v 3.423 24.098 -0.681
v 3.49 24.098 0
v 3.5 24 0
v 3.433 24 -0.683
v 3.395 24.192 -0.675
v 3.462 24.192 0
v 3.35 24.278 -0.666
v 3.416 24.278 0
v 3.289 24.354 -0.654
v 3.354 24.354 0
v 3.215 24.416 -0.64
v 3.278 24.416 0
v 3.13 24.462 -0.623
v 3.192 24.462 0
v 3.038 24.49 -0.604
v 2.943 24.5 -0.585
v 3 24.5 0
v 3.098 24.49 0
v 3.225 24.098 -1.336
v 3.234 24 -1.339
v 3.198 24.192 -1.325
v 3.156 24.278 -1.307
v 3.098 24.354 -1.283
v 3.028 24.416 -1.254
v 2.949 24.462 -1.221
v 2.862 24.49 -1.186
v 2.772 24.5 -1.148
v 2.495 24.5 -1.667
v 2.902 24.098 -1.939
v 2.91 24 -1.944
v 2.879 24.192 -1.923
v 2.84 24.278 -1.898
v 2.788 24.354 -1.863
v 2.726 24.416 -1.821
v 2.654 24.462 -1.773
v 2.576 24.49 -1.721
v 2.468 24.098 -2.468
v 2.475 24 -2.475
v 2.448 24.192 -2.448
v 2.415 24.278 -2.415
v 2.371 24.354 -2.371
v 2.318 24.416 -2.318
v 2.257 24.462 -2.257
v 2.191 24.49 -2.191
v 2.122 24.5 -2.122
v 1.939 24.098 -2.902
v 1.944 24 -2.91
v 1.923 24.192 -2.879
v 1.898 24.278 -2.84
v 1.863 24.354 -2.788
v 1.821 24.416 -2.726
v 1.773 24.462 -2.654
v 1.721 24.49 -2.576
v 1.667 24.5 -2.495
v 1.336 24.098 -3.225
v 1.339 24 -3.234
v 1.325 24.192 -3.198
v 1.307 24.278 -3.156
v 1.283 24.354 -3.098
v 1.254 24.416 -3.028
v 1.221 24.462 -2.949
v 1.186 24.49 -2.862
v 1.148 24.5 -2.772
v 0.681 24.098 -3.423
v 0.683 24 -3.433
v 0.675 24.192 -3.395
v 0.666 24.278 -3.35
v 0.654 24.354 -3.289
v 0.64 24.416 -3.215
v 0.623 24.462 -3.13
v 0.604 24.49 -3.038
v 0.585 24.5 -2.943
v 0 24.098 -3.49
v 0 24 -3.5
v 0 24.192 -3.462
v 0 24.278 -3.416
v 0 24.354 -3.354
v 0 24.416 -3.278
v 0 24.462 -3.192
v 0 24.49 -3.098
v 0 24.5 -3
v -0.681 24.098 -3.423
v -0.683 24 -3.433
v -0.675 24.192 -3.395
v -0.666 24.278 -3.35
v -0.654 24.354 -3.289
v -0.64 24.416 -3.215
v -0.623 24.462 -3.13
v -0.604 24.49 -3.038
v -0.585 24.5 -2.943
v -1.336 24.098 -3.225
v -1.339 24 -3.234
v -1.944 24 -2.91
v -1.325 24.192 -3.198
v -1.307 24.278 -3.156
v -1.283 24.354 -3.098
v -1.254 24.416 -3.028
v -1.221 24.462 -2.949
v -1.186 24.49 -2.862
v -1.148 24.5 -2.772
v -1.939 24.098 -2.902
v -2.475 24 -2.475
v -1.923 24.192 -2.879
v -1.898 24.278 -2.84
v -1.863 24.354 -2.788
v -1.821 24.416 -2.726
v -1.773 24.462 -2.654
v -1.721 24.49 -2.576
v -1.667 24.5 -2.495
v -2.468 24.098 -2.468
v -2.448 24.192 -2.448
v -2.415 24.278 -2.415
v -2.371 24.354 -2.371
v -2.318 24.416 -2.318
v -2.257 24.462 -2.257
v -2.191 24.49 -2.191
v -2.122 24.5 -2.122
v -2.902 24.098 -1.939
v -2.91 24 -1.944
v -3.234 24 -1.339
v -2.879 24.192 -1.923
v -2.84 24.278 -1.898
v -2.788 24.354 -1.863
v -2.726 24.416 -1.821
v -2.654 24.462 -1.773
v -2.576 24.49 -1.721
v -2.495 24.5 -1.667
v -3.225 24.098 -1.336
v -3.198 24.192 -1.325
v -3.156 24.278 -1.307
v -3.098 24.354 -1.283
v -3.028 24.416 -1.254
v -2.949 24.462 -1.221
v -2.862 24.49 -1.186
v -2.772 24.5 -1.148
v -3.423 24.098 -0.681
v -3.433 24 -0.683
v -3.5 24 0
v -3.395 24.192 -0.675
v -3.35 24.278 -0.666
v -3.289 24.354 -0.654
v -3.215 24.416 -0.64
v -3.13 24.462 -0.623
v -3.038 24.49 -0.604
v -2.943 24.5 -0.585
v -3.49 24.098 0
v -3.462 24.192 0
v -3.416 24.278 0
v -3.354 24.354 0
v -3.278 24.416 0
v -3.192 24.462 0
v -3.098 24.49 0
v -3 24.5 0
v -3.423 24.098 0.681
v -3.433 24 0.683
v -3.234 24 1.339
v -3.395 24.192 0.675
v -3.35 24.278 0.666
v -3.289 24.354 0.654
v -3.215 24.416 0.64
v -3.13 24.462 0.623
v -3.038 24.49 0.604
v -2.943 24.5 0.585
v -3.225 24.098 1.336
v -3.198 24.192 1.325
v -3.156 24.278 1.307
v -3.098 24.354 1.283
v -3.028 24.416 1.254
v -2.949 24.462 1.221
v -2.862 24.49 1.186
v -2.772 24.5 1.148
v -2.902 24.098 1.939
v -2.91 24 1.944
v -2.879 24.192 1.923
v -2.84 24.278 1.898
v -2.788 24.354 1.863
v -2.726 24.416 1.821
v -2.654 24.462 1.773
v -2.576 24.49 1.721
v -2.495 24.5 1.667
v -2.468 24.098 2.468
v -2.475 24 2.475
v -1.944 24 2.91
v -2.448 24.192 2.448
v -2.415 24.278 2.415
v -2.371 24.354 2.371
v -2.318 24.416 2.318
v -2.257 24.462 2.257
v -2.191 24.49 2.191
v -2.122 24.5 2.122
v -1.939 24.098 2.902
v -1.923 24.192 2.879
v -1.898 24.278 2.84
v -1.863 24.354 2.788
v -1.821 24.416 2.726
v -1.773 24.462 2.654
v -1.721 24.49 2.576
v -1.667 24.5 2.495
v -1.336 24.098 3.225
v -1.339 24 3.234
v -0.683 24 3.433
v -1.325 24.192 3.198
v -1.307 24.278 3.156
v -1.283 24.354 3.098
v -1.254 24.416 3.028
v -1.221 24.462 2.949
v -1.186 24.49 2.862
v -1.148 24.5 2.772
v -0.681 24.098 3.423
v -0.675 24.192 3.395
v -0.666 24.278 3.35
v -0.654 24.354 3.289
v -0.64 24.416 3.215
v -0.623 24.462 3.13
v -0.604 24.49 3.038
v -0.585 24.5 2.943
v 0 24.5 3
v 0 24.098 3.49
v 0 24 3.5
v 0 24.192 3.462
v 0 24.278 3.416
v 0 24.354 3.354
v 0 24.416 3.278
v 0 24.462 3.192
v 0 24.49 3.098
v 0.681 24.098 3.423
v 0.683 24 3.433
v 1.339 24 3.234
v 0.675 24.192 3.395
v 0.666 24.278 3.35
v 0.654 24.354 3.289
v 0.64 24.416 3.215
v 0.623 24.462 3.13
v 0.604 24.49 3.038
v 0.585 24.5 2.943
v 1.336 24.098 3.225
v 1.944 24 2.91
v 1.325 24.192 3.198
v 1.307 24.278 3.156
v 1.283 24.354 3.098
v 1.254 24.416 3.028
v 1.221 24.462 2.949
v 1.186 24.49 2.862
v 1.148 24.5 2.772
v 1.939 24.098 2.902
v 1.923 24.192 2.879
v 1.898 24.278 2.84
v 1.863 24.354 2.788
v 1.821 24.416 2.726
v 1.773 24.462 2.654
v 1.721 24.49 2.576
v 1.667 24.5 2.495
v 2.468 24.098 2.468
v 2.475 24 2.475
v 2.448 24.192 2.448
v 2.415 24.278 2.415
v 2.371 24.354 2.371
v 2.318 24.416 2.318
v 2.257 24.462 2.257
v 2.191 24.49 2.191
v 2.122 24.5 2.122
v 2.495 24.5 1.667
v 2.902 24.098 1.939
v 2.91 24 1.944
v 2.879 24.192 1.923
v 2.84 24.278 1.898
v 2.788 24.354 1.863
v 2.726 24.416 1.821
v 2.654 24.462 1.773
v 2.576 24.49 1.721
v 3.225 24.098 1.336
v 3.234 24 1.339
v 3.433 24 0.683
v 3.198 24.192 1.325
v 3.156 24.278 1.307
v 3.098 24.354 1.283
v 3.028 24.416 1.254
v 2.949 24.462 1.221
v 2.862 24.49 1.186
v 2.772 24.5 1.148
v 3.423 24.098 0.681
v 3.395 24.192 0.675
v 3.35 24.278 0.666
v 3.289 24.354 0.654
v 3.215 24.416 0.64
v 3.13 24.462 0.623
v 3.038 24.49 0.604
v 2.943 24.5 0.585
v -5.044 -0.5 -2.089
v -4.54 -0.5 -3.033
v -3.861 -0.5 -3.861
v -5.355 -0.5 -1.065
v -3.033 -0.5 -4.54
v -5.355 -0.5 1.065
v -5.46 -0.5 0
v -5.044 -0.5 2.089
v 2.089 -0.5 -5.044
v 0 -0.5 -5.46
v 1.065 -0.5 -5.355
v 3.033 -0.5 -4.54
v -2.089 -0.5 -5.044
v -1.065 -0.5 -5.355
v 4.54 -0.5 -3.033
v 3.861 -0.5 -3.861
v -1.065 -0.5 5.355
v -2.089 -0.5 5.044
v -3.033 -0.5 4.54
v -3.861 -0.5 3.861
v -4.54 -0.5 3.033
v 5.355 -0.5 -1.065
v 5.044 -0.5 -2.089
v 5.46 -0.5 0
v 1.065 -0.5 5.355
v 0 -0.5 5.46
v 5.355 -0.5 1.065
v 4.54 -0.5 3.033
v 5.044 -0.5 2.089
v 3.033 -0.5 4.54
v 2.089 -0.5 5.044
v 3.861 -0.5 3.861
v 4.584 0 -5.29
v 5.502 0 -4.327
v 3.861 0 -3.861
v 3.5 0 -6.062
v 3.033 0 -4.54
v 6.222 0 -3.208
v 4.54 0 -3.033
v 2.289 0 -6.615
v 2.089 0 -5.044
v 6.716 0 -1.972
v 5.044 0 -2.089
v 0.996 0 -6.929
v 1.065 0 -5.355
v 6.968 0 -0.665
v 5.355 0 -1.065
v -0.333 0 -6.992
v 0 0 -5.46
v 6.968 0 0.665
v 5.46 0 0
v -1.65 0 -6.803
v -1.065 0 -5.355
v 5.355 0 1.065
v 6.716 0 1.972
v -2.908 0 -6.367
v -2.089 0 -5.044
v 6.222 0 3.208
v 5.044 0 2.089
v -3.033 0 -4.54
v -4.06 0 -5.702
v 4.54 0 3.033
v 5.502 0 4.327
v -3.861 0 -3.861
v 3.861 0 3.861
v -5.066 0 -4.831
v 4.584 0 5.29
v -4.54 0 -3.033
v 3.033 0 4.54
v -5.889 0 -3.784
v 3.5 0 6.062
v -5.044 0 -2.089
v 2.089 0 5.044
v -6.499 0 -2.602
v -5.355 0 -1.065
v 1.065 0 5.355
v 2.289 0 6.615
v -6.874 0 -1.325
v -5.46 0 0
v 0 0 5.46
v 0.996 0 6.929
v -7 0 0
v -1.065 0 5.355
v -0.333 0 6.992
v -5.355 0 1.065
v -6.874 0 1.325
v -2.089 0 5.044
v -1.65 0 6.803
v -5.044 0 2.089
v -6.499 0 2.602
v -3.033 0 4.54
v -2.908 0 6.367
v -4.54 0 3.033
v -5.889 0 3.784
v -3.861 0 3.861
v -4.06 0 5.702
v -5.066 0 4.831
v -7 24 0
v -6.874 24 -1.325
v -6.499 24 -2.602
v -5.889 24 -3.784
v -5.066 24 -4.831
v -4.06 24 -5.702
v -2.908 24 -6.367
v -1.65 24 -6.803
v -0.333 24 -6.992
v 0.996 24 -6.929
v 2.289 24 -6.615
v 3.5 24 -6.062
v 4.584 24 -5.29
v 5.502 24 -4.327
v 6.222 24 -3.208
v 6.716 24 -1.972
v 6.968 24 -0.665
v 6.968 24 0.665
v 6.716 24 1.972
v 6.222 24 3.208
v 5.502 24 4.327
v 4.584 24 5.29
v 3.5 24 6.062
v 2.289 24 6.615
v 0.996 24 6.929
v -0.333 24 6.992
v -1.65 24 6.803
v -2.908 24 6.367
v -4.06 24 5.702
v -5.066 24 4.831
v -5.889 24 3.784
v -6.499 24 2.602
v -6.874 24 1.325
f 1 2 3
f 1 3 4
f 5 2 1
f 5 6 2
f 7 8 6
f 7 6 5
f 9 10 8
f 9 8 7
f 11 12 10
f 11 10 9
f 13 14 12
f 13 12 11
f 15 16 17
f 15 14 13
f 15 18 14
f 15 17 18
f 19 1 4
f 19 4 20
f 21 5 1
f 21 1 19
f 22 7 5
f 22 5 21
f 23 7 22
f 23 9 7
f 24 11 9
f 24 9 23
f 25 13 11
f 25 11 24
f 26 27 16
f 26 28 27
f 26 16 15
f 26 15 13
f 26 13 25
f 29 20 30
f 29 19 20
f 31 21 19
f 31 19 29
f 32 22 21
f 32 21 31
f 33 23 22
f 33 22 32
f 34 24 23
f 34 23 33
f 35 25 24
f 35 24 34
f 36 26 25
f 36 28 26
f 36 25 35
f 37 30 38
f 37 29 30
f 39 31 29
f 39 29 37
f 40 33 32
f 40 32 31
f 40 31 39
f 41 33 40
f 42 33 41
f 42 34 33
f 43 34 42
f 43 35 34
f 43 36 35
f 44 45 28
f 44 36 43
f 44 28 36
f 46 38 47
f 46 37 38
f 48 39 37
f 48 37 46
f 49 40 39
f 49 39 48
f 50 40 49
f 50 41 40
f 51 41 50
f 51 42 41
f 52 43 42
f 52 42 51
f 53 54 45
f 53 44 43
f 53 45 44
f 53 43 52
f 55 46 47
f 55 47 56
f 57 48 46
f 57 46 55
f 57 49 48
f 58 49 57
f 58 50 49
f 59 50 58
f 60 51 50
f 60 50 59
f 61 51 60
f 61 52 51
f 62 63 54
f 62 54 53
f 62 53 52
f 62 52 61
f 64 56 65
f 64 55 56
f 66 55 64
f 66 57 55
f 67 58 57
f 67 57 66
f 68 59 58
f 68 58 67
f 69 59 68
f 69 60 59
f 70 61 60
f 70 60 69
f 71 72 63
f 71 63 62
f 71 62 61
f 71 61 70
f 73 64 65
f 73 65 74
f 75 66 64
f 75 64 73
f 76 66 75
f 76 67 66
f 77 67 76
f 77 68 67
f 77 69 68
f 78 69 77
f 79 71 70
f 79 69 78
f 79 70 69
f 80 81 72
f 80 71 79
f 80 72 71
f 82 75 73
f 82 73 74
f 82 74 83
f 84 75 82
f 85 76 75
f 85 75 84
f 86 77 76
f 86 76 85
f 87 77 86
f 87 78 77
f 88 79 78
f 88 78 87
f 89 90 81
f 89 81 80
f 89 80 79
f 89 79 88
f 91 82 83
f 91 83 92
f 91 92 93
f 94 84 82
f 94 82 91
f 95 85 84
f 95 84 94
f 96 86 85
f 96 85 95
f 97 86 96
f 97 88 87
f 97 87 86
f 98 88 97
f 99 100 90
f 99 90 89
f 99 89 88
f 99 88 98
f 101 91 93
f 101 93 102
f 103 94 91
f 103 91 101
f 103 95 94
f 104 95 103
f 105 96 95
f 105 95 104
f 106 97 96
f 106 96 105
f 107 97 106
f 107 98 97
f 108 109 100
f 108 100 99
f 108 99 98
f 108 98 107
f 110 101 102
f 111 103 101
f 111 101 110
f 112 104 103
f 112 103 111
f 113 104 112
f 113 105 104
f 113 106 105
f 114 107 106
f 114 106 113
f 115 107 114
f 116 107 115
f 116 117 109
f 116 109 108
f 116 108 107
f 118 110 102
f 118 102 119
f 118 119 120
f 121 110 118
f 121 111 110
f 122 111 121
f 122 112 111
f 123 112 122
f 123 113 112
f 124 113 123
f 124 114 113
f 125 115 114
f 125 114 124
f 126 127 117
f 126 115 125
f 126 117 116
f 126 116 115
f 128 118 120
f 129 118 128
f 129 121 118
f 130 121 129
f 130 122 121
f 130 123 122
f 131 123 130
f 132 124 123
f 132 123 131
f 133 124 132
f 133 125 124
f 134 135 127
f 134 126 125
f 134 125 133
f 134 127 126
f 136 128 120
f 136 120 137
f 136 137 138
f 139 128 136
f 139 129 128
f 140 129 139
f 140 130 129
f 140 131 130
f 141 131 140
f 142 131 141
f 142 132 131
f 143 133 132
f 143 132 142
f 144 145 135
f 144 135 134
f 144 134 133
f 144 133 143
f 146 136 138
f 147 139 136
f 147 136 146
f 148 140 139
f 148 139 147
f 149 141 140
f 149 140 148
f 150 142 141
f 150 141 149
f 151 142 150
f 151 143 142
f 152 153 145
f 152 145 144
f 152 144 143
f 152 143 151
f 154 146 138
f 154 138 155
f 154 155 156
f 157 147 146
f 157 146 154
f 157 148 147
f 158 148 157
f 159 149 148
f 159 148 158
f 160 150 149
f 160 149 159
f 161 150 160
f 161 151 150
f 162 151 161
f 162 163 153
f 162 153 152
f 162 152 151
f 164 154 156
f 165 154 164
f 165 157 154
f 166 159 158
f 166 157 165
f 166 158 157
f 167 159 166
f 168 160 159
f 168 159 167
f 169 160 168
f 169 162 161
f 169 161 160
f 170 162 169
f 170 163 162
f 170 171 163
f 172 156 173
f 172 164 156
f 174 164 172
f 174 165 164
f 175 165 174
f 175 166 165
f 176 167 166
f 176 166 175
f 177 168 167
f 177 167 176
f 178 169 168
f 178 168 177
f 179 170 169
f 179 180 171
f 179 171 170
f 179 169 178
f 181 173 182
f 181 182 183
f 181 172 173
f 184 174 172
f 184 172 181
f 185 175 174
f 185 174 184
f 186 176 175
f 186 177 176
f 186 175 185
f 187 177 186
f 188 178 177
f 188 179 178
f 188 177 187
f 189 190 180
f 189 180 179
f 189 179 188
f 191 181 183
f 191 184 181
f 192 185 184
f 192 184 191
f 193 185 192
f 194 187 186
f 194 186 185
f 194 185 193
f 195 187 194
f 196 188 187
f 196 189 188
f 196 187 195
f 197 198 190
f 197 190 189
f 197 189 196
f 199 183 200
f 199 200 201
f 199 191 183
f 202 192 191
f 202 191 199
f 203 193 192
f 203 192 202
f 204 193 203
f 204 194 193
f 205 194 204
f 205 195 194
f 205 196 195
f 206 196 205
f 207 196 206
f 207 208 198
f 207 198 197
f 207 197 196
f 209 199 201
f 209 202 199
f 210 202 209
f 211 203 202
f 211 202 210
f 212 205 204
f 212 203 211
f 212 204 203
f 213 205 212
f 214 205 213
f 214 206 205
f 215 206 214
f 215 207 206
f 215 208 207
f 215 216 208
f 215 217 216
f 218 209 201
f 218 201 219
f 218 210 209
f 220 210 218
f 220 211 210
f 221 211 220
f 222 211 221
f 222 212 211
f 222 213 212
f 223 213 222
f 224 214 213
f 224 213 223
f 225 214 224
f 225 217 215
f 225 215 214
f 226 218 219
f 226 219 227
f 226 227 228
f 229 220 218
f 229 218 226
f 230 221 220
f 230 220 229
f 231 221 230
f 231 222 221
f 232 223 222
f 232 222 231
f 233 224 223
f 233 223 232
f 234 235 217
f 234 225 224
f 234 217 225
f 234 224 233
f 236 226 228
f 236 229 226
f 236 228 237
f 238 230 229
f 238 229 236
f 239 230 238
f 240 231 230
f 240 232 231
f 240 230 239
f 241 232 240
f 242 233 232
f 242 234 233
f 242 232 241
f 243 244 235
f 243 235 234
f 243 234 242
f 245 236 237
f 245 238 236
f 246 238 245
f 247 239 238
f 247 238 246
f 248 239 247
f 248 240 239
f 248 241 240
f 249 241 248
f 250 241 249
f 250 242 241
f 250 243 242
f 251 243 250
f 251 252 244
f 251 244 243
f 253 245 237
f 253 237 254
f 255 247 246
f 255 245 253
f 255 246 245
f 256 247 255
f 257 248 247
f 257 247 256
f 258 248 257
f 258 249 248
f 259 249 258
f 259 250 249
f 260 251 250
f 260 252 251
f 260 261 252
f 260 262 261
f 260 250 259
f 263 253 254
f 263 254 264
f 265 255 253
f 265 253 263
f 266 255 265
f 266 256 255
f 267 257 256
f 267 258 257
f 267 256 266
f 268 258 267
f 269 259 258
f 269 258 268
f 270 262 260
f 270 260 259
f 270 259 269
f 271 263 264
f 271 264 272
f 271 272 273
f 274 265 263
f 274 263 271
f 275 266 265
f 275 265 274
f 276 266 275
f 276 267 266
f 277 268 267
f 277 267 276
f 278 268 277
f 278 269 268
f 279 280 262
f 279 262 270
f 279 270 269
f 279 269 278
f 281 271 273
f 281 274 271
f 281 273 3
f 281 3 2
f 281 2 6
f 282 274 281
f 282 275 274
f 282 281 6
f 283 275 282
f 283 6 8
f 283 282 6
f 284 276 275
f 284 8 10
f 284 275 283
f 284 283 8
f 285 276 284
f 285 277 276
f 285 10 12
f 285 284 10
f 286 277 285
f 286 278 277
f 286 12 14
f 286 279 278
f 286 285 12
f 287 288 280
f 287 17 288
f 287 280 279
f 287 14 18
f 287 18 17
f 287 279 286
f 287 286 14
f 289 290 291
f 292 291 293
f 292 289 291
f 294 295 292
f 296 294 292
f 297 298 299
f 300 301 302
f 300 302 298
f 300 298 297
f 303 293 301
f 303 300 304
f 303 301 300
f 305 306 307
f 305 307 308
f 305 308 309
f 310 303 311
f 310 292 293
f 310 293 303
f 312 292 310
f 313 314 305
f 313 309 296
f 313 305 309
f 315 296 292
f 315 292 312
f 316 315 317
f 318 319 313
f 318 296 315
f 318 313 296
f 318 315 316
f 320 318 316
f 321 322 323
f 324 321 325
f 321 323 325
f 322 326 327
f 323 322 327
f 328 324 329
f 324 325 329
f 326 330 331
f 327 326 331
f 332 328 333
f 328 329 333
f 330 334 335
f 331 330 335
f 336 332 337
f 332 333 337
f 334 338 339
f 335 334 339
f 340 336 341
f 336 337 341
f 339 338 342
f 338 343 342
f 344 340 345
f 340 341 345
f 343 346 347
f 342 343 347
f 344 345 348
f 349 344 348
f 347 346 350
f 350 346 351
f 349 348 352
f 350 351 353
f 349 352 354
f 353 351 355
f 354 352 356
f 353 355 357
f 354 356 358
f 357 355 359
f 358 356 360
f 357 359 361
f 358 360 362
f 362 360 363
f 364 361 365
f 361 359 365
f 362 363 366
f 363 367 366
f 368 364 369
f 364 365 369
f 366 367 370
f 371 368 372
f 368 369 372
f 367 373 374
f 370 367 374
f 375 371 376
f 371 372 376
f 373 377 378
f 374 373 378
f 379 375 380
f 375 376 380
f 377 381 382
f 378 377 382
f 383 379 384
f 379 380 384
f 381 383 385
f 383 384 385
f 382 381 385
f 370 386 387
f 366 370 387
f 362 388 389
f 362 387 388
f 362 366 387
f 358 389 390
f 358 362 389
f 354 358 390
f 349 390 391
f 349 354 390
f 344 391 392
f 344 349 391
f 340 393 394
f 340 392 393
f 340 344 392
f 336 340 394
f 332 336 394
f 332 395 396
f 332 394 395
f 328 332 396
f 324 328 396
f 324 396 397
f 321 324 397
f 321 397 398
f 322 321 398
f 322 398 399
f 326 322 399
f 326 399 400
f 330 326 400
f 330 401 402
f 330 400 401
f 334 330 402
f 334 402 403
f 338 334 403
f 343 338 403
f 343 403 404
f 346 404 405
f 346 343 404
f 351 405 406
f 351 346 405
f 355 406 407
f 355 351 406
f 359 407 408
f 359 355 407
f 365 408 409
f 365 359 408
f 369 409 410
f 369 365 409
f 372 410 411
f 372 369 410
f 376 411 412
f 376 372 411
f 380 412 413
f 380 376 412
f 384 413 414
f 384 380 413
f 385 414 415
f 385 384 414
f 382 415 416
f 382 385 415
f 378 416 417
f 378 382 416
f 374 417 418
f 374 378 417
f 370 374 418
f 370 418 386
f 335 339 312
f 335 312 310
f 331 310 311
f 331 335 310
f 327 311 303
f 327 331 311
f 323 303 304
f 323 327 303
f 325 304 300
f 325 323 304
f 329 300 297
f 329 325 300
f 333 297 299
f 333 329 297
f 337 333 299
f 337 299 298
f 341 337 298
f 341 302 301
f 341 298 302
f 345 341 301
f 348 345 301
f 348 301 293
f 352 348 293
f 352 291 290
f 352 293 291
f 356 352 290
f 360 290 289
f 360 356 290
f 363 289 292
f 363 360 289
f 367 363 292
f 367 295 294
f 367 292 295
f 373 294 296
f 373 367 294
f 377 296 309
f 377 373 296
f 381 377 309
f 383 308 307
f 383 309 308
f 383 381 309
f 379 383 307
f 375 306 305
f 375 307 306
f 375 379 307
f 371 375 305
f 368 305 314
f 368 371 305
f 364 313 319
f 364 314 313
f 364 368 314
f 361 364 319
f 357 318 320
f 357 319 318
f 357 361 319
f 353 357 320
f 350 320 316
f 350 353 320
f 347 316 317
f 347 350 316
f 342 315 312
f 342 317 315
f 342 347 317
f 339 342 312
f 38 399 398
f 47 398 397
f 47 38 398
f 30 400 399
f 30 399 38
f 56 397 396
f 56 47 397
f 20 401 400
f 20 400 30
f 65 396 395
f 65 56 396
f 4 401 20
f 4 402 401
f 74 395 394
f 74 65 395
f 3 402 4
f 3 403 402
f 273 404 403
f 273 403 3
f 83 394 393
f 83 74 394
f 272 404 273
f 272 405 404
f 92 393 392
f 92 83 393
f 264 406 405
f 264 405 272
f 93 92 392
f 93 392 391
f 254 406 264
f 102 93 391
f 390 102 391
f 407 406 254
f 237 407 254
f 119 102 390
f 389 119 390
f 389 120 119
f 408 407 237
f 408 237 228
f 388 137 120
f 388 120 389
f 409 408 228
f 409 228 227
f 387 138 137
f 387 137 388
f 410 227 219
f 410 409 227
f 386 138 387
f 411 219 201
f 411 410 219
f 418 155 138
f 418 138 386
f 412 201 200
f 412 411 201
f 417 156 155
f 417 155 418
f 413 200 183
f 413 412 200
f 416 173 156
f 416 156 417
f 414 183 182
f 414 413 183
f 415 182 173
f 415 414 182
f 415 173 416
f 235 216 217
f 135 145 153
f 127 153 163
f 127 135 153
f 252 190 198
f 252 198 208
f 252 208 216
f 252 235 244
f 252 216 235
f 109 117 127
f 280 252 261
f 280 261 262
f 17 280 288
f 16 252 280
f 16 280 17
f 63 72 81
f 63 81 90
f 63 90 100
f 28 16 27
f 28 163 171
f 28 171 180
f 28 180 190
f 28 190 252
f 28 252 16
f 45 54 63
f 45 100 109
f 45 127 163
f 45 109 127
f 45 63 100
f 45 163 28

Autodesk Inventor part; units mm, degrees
ref_plane "YZ Plane" through (0, 0, 0) normal (1, 0, 0) x (0, 1, 0)
ref_plane "XZ Plane" through (0, 0, 0) normal (0, 1, 0) x (-1, 0, 0)
ref_plane "XY Plane" through (0, 0, 0) normal (0, 0, 1) x (1, 0, 0)
sketch "Skizze1" plane through (0, 0, 0) normal (0, 1, 0) x (-1, 0, 0)
  circle A0 centre (0, 0) radius 7
  dimension "d0" = 14
extrude "Extrusion1" add sketch "Skizze1" along normal blind 24
sketch "Skizze2" plane through (0, 24, 0) normal (0, 1, 0) x (1, 0, 0)
  circle A0 centre (0, 0) radius 3.5
  dimension "d3" = 7
extrude "Extrusion2" add sketch "Skizze2" along normal blind 0.5
fillet "Rundung1" radius 0.5 1 edges at (-3.5, 24.5, 0)
sketch "Skizze3" plane through (0, 0, 0) normal (0, -1, 0) x (1, 0, 0)
  circle A0 centre (0, 0) radius 3.5 projected
  circle A1 centre (0, 0) radius 5.4598
extrude "Extrusion3" add sketch "Skizze3" along normal blind 0.5 contours A0 | A1
properties part number "Li-Ion 14250"
